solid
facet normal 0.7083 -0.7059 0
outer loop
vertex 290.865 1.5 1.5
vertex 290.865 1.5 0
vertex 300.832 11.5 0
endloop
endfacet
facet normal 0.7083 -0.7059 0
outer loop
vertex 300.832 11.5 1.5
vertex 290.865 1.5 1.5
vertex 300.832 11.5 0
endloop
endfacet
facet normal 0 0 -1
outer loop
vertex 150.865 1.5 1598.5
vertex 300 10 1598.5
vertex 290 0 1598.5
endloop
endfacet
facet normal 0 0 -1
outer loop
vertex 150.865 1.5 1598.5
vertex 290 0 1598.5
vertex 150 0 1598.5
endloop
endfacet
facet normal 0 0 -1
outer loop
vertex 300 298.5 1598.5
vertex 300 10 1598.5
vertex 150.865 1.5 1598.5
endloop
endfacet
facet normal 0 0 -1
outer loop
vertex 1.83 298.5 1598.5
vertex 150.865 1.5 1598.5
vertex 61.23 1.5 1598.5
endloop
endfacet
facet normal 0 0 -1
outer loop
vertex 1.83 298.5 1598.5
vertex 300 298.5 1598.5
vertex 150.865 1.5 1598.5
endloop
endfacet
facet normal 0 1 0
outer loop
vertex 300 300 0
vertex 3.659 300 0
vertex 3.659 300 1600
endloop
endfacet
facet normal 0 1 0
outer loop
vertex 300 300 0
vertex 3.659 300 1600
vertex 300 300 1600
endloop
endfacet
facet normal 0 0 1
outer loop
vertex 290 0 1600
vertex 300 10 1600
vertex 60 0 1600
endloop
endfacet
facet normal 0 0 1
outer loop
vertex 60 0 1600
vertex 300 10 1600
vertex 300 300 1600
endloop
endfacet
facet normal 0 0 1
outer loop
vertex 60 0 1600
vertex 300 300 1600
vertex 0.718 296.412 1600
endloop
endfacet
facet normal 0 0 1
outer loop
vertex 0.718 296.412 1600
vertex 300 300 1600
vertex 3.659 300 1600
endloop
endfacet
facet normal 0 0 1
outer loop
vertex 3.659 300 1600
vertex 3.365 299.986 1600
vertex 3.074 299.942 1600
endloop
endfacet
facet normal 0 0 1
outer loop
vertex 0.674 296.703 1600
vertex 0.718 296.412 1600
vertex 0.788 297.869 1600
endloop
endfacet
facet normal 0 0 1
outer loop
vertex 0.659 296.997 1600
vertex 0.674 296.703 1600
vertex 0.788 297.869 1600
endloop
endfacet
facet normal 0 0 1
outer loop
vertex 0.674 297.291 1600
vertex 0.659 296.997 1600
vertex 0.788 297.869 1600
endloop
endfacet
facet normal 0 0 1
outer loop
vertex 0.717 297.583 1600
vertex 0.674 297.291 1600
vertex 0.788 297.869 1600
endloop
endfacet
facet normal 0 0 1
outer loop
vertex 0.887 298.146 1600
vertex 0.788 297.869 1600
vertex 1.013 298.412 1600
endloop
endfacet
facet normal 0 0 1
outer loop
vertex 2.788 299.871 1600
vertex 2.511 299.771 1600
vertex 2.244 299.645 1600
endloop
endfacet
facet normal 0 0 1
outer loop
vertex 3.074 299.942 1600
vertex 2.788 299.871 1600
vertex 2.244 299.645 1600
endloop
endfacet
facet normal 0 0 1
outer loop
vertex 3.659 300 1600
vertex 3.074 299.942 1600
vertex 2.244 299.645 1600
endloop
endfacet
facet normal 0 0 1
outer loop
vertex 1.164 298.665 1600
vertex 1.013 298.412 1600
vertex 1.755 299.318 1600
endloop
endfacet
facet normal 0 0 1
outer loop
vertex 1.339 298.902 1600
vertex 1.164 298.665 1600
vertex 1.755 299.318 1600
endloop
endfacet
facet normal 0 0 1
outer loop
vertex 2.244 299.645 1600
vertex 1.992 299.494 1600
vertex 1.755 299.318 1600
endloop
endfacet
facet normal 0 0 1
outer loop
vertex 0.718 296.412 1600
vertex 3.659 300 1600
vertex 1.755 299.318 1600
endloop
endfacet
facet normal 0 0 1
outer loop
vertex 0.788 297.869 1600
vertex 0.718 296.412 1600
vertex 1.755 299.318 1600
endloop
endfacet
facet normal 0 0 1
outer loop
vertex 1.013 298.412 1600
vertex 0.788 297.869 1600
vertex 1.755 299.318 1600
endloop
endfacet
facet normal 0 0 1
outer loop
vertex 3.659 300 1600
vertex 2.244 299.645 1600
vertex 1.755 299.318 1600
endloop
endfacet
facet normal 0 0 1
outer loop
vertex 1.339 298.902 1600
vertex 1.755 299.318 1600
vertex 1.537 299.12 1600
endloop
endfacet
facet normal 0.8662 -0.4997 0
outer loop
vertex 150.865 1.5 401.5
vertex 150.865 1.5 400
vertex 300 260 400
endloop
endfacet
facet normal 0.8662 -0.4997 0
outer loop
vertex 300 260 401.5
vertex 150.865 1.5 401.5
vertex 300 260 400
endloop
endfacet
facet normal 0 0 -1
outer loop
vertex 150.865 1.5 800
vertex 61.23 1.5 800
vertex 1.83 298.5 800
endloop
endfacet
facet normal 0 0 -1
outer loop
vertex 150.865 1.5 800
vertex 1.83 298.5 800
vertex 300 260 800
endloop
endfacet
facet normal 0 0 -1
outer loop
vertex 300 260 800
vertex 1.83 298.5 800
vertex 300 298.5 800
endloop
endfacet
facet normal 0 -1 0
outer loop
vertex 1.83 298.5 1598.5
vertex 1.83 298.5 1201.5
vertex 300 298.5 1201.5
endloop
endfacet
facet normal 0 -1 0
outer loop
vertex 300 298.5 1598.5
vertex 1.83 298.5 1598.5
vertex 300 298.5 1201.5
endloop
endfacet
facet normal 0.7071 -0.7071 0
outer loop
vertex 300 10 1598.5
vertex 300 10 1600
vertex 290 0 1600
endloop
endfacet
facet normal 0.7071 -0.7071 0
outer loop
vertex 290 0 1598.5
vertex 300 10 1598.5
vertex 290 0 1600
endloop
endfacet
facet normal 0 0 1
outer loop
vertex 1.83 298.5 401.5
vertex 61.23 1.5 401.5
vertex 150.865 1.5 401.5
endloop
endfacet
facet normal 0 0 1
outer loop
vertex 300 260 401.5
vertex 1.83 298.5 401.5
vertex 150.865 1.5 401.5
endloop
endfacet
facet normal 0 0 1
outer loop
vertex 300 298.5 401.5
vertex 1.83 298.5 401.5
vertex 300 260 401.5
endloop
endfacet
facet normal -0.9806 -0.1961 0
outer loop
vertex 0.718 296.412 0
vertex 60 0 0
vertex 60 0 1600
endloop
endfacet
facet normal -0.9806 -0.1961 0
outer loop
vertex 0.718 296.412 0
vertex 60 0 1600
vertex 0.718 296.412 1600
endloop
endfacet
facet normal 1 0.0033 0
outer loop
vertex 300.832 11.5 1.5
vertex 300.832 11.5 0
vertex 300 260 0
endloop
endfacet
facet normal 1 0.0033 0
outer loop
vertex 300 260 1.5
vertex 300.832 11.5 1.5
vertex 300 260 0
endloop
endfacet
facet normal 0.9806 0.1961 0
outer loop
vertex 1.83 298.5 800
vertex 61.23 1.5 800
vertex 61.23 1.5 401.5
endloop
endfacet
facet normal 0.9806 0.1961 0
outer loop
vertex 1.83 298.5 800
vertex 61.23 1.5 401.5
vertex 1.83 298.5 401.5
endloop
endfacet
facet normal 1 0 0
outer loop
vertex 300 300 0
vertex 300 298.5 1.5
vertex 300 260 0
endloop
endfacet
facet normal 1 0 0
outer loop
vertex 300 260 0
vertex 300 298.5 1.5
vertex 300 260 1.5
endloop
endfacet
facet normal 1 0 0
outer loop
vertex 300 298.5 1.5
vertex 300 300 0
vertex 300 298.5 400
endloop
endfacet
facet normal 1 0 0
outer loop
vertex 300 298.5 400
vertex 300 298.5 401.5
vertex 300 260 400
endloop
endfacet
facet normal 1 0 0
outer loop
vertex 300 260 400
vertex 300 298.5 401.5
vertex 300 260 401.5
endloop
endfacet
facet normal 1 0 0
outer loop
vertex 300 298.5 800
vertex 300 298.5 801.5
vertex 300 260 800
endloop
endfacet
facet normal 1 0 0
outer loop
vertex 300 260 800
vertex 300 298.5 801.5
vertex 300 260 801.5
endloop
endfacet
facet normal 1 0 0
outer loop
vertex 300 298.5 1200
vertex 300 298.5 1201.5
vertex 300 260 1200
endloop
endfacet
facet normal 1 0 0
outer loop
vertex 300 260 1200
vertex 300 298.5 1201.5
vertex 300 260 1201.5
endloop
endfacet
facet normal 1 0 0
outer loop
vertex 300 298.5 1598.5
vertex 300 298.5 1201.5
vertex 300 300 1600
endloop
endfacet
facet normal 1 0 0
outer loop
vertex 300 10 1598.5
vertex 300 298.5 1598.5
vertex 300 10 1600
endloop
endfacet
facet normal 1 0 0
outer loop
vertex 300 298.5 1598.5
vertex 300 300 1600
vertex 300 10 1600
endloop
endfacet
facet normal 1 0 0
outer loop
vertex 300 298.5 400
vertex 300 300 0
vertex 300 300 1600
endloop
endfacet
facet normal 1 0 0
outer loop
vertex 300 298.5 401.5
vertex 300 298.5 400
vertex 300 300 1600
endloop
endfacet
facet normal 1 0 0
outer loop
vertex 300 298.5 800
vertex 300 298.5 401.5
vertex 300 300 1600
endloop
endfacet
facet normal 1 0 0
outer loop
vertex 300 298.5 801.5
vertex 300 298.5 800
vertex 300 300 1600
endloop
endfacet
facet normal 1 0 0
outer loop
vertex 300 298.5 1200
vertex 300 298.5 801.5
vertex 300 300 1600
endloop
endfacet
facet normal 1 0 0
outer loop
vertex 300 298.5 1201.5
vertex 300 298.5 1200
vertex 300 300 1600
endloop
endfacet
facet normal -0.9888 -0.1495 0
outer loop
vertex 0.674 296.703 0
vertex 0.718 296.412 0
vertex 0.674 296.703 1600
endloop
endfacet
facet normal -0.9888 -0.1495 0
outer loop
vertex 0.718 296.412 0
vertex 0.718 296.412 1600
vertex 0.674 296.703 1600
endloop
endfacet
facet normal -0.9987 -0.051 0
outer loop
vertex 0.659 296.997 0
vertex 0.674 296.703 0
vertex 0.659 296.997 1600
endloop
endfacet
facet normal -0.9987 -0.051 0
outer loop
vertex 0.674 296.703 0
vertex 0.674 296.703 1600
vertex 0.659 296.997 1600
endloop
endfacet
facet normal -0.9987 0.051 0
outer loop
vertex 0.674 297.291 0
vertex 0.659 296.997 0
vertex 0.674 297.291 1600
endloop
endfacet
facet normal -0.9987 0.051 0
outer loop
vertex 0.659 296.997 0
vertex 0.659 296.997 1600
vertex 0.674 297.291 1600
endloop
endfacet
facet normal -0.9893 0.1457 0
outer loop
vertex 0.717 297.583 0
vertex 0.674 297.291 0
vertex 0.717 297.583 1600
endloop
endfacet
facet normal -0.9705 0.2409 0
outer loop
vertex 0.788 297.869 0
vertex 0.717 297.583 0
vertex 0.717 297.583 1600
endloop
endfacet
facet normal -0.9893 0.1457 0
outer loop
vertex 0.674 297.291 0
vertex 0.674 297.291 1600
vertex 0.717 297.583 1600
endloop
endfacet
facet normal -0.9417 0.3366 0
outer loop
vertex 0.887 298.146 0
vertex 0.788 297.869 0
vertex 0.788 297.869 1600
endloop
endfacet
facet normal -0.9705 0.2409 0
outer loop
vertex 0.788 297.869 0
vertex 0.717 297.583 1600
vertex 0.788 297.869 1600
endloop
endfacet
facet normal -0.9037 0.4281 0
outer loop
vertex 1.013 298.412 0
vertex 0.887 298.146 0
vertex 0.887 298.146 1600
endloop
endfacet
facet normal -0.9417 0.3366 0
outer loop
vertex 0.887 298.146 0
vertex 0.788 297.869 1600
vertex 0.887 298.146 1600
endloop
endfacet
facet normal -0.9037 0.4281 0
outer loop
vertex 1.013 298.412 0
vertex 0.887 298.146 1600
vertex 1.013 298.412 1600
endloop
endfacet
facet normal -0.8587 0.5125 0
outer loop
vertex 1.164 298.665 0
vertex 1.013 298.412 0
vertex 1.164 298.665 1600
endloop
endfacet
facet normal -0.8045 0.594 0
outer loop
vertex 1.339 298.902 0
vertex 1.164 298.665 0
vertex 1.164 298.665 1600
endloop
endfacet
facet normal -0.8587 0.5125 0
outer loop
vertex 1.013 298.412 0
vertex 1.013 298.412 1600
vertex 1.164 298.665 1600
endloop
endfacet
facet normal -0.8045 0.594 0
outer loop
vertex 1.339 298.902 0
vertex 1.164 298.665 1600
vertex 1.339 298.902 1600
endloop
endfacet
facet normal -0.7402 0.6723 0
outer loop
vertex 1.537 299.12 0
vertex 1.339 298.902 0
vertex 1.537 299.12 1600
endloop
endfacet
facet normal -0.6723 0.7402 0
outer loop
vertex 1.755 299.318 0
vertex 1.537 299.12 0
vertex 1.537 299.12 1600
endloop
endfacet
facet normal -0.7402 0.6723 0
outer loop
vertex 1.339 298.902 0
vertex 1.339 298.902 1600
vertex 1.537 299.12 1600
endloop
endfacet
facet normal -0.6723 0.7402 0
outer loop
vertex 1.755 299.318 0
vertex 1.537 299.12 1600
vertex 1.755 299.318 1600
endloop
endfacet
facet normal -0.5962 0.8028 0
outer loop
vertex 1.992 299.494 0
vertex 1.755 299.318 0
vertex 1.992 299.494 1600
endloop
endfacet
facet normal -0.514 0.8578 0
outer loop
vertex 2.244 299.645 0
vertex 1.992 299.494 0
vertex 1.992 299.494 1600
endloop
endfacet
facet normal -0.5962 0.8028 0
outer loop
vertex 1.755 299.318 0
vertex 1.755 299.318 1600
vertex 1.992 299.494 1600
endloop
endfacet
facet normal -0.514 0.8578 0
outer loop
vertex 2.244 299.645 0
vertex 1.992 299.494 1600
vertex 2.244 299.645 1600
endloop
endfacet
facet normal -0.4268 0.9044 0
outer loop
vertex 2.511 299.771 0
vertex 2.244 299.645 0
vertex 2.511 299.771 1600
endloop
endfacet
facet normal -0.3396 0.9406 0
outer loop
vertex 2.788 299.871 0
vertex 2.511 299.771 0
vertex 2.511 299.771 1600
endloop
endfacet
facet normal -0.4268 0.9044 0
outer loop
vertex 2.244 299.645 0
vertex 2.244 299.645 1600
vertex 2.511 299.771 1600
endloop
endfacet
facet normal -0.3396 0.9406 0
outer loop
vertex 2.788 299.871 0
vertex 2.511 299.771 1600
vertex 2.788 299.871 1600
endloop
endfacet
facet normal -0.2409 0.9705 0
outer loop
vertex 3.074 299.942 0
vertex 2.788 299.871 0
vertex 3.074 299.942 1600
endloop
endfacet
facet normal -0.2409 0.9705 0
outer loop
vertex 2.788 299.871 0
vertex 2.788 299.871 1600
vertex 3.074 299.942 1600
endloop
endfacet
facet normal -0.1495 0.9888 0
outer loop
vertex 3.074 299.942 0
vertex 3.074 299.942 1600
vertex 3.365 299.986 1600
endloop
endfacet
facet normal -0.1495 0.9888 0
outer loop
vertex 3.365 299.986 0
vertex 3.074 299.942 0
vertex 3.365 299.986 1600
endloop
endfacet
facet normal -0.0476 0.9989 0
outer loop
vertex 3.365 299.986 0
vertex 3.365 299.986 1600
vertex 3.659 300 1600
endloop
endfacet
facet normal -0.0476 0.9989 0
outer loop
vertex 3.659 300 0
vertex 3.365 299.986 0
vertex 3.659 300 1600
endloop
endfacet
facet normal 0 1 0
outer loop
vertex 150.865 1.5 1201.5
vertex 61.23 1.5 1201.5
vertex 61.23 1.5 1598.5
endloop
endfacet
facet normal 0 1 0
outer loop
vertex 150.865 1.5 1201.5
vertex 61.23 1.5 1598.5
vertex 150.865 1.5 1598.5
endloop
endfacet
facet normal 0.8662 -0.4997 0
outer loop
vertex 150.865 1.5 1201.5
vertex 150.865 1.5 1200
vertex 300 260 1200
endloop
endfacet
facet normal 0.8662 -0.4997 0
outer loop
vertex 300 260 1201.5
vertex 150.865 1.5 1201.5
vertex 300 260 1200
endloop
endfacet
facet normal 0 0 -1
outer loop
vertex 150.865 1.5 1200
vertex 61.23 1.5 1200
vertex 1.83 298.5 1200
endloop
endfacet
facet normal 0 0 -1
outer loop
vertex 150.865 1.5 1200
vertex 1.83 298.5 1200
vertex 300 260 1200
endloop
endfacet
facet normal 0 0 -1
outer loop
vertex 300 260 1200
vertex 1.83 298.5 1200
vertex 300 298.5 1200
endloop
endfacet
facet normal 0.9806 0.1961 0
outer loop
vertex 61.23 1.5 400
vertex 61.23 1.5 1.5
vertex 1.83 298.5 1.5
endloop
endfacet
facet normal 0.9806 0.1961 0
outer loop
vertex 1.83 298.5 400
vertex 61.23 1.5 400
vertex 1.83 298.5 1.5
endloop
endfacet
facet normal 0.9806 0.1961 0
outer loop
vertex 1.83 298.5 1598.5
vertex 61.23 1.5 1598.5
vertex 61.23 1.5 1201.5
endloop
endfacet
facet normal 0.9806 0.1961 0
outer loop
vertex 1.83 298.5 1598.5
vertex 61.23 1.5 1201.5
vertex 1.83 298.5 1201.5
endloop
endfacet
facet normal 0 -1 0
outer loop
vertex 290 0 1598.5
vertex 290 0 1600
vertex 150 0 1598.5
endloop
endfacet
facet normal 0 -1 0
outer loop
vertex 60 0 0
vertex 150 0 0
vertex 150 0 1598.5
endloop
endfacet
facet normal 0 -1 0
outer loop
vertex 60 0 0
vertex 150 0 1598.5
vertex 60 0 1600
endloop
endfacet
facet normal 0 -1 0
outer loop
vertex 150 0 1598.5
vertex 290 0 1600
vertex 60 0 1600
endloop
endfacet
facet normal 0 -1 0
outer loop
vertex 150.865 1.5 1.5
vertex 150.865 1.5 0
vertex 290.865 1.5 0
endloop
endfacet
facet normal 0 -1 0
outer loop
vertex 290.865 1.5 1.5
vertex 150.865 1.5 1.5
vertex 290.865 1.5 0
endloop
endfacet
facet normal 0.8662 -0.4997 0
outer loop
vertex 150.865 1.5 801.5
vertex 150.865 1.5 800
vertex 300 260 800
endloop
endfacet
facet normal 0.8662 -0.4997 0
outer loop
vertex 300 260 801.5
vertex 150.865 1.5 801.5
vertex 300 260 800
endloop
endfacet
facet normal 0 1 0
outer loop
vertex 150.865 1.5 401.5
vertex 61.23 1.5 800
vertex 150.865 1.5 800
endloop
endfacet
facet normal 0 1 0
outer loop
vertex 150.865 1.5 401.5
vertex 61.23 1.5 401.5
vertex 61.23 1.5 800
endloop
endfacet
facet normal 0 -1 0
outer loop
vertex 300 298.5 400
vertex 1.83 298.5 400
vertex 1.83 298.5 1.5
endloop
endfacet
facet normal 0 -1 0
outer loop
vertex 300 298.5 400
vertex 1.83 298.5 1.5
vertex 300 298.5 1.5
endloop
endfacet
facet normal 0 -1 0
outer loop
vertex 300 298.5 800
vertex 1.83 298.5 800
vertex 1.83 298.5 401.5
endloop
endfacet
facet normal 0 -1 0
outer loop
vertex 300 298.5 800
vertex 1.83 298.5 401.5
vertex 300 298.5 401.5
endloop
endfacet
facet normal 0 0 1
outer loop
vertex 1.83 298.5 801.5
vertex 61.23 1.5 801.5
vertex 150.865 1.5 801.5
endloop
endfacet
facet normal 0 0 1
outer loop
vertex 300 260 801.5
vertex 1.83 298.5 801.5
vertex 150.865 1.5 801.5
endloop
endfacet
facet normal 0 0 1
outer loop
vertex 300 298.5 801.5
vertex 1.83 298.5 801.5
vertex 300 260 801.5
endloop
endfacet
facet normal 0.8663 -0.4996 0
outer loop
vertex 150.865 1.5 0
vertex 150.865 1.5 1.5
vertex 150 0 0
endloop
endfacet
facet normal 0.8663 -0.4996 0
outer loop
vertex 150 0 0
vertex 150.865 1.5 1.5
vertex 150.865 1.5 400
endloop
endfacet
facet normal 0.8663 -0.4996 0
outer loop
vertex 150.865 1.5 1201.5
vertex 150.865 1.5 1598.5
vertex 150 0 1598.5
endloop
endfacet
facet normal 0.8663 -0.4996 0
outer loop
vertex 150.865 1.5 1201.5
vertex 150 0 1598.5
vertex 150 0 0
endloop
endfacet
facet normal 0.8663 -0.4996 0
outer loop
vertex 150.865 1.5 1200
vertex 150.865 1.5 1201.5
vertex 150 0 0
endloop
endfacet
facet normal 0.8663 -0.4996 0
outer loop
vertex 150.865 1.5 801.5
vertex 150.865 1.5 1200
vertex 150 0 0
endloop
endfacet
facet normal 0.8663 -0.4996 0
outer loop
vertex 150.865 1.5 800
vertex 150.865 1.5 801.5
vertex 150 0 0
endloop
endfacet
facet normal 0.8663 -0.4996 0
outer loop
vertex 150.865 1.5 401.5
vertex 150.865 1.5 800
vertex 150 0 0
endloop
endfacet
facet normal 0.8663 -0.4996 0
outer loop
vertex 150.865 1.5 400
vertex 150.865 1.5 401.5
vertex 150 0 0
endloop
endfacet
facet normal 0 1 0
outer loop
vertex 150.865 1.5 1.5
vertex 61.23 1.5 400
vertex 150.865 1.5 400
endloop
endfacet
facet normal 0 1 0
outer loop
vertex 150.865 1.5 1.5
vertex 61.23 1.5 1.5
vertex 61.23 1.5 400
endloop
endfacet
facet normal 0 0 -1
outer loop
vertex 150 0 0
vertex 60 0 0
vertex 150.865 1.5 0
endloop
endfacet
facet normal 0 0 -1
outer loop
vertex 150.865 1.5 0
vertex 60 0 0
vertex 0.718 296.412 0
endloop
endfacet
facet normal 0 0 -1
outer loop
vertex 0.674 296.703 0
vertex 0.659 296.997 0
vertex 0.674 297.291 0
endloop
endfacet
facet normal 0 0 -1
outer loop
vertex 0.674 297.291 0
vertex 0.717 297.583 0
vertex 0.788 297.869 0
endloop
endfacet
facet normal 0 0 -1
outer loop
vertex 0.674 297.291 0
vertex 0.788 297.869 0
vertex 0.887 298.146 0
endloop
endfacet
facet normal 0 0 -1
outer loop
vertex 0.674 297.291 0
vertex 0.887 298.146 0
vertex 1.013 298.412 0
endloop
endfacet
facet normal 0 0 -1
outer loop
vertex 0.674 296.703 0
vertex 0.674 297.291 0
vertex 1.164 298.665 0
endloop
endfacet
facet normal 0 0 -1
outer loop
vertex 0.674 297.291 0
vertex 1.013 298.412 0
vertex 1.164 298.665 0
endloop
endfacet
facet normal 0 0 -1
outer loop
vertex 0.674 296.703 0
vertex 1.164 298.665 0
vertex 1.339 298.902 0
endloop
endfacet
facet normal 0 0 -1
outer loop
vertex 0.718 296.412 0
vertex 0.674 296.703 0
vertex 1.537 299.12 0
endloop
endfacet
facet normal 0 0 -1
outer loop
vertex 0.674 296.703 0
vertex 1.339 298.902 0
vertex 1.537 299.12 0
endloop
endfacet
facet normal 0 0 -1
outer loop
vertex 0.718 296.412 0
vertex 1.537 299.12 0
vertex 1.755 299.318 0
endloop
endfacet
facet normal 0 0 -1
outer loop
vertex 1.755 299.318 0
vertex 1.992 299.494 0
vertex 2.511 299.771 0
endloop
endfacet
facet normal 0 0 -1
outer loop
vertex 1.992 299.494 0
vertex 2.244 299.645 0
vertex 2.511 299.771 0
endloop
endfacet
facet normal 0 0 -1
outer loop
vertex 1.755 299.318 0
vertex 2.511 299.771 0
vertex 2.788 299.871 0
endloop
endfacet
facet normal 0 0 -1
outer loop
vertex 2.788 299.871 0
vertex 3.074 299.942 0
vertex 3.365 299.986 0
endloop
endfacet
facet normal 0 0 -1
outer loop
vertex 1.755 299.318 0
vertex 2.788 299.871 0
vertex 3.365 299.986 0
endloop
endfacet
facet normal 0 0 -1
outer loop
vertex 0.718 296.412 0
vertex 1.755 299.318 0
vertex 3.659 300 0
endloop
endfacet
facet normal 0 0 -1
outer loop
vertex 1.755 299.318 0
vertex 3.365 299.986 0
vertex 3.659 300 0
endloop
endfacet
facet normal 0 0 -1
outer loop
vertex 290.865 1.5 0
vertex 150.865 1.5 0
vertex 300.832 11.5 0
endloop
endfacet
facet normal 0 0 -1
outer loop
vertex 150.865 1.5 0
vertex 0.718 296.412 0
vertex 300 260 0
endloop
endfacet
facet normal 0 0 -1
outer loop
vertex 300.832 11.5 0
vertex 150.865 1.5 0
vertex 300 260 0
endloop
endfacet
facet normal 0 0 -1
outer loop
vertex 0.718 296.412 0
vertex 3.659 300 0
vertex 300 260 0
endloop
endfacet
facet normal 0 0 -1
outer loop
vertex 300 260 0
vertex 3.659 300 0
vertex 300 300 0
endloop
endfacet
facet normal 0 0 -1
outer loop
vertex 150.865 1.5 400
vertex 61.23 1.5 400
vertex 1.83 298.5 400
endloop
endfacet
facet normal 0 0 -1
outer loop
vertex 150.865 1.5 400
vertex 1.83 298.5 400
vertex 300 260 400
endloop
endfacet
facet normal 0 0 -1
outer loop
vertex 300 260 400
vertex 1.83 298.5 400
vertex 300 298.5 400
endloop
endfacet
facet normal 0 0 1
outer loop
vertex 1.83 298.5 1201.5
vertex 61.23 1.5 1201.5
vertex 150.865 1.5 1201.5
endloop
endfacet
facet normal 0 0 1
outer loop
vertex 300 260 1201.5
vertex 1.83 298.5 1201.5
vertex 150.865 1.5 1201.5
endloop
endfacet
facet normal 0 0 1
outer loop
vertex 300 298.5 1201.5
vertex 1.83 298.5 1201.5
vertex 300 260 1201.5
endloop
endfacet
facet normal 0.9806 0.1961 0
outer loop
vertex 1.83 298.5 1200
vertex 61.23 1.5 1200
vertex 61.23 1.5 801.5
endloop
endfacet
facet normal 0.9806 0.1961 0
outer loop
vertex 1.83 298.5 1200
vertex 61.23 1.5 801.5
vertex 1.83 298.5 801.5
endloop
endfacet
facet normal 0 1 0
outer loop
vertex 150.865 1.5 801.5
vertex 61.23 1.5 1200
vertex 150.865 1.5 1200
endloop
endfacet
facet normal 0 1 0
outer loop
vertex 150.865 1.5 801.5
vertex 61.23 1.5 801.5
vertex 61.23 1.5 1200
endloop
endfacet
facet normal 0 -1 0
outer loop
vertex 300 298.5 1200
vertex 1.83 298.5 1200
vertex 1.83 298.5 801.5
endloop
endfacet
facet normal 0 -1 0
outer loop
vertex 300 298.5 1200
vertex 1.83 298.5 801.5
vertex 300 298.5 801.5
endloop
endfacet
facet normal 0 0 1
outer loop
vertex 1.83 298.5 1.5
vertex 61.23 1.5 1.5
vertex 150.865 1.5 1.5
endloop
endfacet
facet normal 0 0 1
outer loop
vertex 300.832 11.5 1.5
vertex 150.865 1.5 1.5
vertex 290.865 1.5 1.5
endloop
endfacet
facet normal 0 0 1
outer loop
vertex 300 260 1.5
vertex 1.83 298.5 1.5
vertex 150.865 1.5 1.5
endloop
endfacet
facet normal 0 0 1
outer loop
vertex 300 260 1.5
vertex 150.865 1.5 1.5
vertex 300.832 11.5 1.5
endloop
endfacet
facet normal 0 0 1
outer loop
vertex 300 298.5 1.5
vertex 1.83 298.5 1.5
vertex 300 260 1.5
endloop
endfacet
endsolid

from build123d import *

# Parameters (mm, degrees)
SKETCH_1_W             = 300
SKETCH_1_H             = 300
EXTRUDE_1_DEPTH        = 1600
CUT_EXTRUDE_1_DEPTH    = 1656.294535725
CUT_EXTRUDE_4_DEPTH    = 1656.294535725
SHELL_2_T              = -1.5
EXTRUDE_2_DEPTH        = 1.5
PATTERN_LINEAR_1_COUNT = 3
PATTERN_LINEAR_1_PITCH = 400
EXTRUDE_3_DEPTH        = 1.5
EXTRUDE_4_DEPTH        = 1.5
FILLET_1_R             = 3


with BuildPart() as part:
    # 草图1 → 凸台-拉伸1 (new body)
    with BuildSketch(Plane.XY):
        with Locations((150, 150)):
            Rectangle(SKETCH_1_W, SKETCH_1_H)
    extrude(amount=EXTRUDE_1_DEPTH)

    # 草图7 → 切除-拉伸1 (cut, through all)
    with BuildSketch(Plane.XY.offset(1600)):
        Polygon((300, 260), (150, 0), (300, 0), align=None)
    extrude(amount=-CUT_EXTRUDE_1_DEPTH, mode=Mode.SUBTRACT)

    # 草图11 → 切除-拉伸4 (cut, through all)
    with BuildSketch(Plane.XY.offset(1600)):
        Polygon((0, 300), (0, 0), (60, 0), align=None)
    extrude(amount=-CUT_EXTRUDE_4_DEPTH, mode=Mode.SUBTRACT)

    # 抽壳2
    shell_2_openings = [part.faces().sort_by_distance(p)[0] for p in [
        (225, 130, 800),
        (300, 280, 800),
    ]]
    offset(amount=SHELL_2_T, openings=shell_2_openings, kind=Kind.INTERSECTION)

    # 草图13 → 凸台-拉伸2 (add)
    with BuildSketch(Plane.XY.offset(1200)):
        Polygon((1.829705854, 298.5), (61.229705854, 1.5), (150.865384615, 1.5), (300, 260), (300, 298.5), align=None)
    extrude_2 = extrude(amount=EXTRUDE_2_DEPTH)

    # 阵列(线性)1: 凸台-拉伸2 ×3
    with Locations(*[(0, 0, -i * PATTERN_LINEAR_1_PITCH) for i in range(1, PATTERN_LINEAR_1_COUNT)]):
        add(extrude_2)

    # 草图14 → 凸台-拉伸3 (add)
    with BuildSketch(Plane.XY.offset(1600)):
        Polygon((300, 260), (300, 10), (290, 0), (150, 0), align=None)
    extrude(amount=-EXTRUDE_3_DEPTH)

    # 草图15 → 凸台-拉伸4 (add)
    with BuildSketch(Plane(origin=(0, 0, 0), x_dir=(-1, 0, 0), z_dir=(0, 0, -1))):
        Polygon((-300, 260), (-150.865384615, 1.5), (-290.865384615, 1.5), (-300.831907642, 11.499943964), align=None)
    extrude(amount=-EXTRUDE_4_DEPTH)

    # 圆角1
    fillet_1_edges = [part.edges().sort_by_distance(p)[0] for p in [
        (0, 300, 800),
    ]]
    fillet(fillet_1_edges, radius=FILLET_1_R)


solid = part.part
